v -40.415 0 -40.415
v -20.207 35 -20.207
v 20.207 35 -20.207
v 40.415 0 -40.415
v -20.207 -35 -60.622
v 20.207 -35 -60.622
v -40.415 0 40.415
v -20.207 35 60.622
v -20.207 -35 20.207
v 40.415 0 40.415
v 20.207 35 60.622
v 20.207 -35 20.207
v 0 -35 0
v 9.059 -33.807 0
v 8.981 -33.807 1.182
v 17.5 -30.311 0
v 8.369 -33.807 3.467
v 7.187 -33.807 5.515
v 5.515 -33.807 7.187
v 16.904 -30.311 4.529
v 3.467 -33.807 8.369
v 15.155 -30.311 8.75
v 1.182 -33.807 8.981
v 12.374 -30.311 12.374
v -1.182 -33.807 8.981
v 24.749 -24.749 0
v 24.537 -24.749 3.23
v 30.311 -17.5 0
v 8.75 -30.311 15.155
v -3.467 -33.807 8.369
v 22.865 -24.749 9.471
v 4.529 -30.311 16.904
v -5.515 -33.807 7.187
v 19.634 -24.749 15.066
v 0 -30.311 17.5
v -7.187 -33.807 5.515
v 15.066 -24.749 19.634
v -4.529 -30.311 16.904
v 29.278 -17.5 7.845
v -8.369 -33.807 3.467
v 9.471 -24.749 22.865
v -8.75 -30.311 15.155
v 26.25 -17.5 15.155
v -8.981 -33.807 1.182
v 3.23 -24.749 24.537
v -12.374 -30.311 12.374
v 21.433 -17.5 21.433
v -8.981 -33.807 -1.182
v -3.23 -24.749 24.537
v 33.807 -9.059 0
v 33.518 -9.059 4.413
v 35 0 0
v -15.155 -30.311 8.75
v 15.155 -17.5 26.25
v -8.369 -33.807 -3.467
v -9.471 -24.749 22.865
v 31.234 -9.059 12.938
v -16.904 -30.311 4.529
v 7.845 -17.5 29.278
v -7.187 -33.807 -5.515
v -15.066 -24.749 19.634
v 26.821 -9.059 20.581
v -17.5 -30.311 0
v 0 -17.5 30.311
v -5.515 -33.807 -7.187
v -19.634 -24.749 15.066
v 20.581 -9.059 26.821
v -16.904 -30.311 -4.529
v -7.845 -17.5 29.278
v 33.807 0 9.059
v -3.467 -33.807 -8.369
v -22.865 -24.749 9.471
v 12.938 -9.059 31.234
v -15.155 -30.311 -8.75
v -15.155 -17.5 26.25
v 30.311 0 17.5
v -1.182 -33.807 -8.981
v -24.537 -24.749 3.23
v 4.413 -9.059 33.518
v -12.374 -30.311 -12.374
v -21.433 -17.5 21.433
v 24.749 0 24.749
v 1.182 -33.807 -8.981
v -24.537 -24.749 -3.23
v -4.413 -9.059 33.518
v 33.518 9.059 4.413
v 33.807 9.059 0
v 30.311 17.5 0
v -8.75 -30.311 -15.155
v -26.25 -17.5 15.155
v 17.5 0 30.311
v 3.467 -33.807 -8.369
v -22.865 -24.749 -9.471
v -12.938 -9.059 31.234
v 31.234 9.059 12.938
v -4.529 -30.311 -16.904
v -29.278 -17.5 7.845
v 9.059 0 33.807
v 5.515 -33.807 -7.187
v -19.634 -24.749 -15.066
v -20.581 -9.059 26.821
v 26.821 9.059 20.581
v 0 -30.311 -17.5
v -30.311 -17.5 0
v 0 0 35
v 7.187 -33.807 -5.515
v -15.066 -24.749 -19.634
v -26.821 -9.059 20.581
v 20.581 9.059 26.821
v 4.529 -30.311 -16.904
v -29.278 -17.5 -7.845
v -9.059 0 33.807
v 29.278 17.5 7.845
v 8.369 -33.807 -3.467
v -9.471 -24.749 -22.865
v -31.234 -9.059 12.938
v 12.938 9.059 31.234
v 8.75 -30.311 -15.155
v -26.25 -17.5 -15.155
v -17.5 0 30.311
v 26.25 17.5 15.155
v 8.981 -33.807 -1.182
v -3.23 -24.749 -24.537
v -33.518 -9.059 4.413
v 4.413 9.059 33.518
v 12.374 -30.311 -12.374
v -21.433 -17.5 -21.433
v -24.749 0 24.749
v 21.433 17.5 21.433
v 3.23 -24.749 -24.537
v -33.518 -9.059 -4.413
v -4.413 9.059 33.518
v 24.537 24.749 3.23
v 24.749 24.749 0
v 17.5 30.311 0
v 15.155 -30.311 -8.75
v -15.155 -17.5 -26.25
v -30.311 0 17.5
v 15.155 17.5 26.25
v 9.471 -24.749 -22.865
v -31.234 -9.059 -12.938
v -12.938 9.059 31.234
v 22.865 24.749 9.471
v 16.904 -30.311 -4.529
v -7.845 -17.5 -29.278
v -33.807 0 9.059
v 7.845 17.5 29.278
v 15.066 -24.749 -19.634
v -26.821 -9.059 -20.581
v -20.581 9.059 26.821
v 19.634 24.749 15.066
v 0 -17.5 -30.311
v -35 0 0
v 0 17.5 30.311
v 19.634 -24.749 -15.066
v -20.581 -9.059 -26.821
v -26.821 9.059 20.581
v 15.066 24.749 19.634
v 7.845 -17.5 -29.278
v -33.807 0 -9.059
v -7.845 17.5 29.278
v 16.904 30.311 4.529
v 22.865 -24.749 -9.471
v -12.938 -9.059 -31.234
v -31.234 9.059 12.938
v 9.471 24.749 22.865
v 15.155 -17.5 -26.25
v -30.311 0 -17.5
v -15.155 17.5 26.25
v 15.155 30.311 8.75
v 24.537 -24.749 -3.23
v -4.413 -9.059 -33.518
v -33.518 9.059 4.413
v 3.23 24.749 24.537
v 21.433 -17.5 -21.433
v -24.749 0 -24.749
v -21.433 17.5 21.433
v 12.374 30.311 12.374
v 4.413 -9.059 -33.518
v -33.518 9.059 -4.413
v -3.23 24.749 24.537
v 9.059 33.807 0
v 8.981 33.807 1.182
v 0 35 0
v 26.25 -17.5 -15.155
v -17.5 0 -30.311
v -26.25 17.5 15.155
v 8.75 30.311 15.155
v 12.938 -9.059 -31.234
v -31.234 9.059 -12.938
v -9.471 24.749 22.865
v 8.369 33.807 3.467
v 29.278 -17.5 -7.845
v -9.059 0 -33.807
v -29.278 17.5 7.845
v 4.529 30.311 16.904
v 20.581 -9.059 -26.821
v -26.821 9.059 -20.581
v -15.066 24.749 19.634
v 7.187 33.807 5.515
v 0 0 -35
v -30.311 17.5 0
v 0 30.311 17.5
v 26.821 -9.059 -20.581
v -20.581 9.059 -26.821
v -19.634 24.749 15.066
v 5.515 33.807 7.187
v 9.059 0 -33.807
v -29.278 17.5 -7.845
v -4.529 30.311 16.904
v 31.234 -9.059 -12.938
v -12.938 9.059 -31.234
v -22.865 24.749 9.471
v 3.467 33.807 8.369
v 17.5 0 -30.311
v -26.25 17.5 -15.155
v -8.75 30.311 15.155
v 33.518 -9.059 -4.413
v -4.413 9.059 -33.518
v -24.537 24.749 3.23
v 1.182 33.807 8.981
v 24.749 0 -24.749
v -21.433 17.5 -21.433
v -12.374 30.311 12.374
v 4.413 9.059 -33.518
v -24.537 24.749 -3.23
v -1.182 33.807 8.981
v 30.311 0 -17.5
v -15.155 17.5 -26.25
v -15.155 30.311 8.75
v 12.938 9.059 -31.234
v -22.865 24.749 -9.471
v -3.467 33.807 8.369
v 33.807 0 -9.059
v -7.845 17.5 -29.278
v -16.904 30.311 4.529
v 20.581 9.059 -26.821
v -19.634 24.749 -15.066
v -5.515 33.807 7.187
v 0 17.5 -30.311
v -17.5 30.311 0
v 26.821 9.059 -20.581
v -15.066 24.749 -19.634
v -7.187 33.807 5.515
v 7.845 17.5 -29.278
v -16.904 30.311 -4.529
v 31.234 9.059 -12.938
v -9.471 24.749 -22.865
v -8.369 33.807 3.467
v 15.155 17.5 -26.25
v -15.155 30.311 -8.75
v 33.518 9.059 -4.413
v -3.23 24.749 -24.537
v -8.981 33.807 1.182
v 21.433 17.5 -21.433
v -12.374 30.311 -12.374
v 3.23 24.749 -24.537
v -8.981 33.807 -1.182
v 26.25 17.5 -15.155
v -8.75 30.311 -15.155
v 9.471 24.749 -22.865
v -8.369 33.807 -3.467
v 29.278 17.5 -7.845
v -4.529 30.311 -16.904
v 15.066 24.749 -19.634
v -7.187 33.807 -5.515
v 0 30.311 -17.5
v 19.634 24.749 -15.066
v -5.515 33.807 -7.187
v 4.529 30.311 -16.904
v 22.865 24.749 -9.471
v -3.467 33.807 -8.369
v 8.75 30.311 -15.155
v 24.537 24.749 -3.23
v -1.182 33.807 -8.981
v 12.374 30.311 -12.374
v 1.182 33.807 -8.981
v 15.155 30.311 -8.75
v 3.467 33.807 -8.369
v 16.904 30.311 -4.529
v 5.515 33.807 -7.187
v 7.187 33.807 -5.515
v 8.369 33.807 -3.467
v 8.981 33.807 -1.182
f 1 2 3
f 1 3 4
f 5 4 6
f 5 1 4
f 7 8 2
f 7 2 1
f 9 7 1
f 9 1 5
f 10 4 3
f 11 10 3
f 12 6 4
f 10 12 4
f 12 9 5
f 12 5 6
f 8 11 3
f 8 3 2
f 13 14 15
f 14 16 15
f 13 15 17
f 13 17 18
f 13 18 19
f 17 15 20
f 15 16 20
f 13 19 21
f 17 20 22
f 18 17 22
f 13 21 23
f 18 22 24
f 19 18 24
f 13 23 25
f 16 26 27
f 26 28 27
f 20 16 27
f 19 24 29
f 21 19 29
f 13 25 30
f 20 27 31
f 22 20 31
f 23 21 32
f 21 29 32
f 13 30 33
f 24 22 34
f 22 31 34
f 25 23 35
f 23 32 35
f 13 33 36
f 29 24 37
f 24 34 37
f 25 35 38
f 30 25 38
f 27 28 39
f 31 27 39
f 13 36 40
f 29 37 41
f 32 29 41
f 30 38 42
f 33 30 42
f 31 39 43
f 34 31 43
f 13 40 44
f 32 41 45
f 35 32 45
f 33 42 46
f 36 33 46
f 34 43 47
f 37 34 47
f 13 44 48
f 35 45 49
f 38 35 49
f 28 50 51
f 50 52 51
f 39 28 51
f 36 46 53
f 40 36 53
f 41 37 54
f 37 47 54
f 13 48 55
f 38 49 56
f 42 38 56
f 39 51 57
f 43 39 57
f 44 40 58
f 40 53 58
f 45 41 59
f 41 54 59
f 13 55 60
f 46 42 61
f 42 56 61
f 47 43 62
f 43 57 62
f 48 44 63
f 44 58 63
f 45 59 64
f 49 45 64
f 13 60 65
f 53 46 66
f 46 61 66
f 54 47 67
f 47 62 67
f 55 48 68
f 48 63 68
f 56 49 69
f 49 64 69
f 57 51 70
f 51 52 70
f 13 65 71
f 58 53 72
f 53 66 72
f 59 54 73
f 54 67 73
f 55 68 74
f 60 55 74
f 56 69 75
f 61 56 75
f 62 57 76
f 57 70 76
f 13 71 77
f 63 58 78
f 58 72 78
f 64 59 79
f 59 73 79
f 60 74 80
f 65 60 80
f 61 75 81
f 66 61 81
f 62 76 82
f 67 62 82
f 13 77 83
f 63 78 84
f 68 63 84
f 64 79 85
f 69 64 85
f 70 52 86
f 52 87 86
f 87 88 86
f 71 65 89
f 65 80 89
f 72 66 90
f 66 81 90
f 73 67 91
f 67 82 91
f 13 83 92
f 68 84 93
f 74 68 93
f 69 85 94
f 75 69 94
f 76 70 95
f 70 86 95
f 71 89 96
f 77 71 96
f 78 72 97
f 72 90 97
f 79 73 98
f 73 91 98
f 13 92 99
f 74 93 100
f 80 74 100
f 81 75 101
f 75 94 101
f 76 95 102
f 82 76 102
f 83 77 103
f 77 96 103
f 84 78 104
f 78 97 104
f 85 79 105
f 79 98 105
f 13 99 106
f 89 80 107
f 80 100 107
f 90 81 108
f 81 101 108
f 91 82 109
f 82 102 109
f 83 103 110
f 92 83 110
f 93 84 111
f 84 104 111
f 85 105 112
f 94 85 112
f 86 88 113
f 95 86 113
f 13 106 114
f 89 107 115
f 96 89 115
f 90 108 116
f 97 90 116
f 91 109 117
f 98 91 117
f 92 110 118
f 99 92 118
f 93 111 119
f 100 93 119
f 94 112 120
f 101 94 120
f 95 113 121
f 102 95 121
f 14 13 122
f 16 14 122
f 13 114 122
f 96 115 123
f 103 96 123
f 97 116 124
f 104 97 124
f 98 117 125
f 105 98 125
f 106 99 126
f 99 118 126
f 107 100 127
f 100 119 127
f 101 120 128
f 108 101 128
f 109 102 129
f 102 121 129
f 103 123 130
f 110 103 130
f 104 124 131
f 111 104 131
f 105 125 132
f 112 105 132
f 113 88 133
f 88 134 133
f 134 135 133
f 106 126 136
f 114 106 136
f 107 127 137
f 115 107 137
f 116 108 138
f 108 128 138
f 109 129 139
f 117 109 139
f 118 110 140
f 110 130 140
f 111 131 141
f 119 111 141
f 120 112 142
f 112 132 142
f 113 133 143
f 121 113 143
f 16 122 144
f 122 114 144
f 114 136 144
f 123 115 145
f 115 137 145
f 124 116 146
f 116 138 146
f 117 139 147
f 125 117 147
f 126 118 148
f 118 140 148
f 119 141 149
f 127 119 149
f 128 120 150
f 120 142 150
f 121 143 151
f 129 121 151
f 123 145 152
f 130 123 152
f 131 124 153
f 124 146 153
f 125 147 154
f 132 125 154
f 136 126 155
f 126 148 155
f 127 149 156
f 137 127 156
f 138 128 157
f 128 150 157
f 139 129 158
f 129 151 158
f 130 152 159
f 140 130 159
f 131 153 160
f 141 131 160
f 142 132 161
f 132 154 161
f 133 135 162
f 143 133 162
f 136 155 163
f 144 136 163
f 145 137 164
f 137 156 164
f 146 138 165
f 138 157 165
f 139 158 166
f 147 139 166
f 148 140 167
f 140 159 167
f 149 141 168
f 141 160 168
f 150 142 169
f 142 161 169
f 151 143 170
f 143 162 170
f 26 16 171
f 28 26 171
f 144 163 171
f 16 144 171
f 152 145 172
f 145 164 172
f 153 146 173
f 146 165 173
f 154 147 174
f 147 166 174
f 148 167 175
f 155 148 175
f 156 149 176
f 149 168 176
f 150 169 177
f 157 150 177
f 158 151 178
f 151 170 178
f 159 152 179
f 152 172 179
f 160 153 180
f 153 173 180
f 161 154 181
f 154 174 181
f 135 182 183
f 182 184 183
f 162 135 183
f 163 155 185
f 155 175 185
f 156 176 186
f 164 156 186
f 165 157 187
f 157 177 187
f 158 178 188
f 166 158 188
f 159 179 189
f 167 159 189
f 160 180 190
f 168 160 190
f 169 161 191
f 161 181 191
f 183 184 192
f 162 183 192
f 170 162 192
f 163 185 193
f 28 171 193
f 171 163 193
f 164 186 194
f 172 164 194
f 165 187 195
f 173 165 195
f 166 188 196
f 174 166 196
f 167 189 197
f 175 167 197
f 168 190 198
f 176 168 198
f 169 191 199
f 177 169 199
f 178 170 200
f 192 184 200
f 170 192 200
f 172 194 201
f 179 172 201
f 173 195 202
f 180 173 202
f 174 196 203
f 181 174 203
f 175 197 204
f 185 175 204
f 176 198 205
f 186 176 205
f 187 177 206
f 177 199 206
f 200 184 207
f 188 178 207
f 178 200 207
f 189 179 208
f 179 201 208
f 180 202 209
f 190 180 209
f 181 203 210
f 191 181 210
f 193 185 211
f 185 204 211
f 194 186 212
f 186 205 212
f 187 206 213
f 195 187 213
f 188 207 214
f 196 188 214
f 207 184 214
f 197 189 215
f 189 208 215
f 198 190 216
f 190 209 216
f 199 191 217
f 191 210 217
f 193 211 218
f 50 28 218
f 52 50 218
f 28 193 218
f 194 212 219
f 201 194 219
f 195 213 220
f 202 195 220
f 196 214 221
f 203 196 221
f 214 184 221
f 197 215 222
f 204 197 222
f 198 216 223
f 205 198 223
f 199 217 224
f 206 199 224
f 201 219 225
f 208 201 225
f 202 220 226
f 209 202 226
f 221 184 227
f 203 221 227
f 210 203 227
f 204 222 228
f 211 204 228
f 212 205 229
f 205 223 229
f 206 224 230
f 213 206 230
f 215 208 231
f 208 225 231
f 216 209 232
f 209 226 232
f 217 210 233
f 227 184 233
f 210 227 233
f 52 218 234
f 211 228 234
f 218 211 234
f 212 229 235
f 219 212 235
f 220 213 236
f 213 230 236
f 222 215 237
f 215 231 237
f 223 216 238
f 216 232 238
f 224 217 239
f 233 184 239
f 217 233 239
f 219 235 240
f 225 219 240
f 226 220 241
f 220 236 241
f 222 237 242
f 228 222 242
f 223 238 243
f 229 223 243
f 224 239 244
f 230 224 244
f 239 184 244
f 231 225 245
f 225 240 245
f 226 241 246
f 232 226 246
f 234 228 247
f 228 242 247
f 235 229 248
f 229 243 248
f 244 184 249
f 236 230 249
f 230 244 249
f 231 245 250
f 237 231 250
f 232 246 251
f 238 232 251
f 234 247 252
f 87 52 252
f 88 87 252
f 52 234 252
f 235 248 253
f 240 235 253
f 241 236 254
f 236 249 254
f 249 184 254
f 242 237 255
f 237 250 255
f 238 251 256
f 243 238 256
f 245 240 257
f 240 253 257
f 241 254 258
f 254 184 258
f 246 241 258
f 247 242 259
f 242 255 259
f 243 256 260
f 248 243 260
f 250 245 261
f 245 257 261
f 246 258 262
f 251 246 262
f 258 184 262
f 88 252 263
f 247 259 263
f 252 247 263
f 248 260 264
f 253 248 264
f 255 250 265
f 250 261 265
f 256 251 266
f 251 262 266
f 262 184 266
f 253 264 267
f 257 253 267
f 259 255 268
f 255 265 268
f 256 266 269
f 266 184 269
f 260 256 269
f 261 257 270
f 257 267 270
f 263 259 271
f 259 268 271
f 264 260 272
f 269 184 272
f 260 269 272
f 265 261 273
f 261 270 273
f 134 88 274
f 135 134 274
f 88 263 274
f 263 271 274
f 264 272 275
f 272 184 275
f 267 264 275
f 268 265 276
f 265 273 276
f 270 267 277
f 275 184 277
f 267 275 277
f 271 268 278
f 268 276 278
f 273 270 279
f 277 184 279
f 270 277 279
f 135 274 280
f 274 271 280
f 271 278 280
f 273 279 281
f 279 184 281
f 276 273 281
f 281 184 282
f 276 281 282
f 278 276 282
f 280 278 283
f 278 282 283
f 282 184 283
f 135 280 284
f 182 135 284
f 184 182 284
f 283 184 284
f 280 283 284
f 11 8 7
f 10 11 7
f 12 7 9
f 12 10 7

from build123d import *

# Parameters (mm, degrees)
EXTRUDE1_DEPTH     = 65
CUT_EXTRUDE1_DEPTH = 45


with BuildPart() as part:
    # Sketch1 → Extrude1 (new body, symmetric)
    with BuildSketch(Plane.XY):
        Polygon((40.414518843, 0), (20.207259422, 35), (-20.207259422, 35), (-40.414518843, 0), (-20.207259422, -35), (20.207259422, -35), align=None)
    extrude(amount=EXTRUDE1_DEPTH, both=True)

    # Sketch3 → Cut-Extrude1 (cut, symmetric)
    with BuildSketch(Plane(origin=(0, 0, 0), x_dir=(0, 0, -1), z_dir=(1, 0, 0))):
        Polygon((65, -35), (65, 35), (20.207259422, 35), (60.621778265, -35), align=None)
        Polygon((-60.621778265, 35), (-20.207259422, -35), (-65, -35), (-65, 35), align=None)
    extrude(amount=CUT_EXTRUDE1_DEPTH, both=True, mode=Mode.SUBTRACT)


with BuildPart() as body_2:
    # Sketch2 → Revolve1 (revolve)
    with BuildSketch(Plane.XY):
        with BuildLine():
            Line((0, 35), (0, -35))
            ThreePointArc((0, -35), (35, 0), (0, 35))
        make_face()
    revolve(axis=Axis((0, 35, 0), (0, -1, 0)))


solid = Compound([part.part, body_2.part])
